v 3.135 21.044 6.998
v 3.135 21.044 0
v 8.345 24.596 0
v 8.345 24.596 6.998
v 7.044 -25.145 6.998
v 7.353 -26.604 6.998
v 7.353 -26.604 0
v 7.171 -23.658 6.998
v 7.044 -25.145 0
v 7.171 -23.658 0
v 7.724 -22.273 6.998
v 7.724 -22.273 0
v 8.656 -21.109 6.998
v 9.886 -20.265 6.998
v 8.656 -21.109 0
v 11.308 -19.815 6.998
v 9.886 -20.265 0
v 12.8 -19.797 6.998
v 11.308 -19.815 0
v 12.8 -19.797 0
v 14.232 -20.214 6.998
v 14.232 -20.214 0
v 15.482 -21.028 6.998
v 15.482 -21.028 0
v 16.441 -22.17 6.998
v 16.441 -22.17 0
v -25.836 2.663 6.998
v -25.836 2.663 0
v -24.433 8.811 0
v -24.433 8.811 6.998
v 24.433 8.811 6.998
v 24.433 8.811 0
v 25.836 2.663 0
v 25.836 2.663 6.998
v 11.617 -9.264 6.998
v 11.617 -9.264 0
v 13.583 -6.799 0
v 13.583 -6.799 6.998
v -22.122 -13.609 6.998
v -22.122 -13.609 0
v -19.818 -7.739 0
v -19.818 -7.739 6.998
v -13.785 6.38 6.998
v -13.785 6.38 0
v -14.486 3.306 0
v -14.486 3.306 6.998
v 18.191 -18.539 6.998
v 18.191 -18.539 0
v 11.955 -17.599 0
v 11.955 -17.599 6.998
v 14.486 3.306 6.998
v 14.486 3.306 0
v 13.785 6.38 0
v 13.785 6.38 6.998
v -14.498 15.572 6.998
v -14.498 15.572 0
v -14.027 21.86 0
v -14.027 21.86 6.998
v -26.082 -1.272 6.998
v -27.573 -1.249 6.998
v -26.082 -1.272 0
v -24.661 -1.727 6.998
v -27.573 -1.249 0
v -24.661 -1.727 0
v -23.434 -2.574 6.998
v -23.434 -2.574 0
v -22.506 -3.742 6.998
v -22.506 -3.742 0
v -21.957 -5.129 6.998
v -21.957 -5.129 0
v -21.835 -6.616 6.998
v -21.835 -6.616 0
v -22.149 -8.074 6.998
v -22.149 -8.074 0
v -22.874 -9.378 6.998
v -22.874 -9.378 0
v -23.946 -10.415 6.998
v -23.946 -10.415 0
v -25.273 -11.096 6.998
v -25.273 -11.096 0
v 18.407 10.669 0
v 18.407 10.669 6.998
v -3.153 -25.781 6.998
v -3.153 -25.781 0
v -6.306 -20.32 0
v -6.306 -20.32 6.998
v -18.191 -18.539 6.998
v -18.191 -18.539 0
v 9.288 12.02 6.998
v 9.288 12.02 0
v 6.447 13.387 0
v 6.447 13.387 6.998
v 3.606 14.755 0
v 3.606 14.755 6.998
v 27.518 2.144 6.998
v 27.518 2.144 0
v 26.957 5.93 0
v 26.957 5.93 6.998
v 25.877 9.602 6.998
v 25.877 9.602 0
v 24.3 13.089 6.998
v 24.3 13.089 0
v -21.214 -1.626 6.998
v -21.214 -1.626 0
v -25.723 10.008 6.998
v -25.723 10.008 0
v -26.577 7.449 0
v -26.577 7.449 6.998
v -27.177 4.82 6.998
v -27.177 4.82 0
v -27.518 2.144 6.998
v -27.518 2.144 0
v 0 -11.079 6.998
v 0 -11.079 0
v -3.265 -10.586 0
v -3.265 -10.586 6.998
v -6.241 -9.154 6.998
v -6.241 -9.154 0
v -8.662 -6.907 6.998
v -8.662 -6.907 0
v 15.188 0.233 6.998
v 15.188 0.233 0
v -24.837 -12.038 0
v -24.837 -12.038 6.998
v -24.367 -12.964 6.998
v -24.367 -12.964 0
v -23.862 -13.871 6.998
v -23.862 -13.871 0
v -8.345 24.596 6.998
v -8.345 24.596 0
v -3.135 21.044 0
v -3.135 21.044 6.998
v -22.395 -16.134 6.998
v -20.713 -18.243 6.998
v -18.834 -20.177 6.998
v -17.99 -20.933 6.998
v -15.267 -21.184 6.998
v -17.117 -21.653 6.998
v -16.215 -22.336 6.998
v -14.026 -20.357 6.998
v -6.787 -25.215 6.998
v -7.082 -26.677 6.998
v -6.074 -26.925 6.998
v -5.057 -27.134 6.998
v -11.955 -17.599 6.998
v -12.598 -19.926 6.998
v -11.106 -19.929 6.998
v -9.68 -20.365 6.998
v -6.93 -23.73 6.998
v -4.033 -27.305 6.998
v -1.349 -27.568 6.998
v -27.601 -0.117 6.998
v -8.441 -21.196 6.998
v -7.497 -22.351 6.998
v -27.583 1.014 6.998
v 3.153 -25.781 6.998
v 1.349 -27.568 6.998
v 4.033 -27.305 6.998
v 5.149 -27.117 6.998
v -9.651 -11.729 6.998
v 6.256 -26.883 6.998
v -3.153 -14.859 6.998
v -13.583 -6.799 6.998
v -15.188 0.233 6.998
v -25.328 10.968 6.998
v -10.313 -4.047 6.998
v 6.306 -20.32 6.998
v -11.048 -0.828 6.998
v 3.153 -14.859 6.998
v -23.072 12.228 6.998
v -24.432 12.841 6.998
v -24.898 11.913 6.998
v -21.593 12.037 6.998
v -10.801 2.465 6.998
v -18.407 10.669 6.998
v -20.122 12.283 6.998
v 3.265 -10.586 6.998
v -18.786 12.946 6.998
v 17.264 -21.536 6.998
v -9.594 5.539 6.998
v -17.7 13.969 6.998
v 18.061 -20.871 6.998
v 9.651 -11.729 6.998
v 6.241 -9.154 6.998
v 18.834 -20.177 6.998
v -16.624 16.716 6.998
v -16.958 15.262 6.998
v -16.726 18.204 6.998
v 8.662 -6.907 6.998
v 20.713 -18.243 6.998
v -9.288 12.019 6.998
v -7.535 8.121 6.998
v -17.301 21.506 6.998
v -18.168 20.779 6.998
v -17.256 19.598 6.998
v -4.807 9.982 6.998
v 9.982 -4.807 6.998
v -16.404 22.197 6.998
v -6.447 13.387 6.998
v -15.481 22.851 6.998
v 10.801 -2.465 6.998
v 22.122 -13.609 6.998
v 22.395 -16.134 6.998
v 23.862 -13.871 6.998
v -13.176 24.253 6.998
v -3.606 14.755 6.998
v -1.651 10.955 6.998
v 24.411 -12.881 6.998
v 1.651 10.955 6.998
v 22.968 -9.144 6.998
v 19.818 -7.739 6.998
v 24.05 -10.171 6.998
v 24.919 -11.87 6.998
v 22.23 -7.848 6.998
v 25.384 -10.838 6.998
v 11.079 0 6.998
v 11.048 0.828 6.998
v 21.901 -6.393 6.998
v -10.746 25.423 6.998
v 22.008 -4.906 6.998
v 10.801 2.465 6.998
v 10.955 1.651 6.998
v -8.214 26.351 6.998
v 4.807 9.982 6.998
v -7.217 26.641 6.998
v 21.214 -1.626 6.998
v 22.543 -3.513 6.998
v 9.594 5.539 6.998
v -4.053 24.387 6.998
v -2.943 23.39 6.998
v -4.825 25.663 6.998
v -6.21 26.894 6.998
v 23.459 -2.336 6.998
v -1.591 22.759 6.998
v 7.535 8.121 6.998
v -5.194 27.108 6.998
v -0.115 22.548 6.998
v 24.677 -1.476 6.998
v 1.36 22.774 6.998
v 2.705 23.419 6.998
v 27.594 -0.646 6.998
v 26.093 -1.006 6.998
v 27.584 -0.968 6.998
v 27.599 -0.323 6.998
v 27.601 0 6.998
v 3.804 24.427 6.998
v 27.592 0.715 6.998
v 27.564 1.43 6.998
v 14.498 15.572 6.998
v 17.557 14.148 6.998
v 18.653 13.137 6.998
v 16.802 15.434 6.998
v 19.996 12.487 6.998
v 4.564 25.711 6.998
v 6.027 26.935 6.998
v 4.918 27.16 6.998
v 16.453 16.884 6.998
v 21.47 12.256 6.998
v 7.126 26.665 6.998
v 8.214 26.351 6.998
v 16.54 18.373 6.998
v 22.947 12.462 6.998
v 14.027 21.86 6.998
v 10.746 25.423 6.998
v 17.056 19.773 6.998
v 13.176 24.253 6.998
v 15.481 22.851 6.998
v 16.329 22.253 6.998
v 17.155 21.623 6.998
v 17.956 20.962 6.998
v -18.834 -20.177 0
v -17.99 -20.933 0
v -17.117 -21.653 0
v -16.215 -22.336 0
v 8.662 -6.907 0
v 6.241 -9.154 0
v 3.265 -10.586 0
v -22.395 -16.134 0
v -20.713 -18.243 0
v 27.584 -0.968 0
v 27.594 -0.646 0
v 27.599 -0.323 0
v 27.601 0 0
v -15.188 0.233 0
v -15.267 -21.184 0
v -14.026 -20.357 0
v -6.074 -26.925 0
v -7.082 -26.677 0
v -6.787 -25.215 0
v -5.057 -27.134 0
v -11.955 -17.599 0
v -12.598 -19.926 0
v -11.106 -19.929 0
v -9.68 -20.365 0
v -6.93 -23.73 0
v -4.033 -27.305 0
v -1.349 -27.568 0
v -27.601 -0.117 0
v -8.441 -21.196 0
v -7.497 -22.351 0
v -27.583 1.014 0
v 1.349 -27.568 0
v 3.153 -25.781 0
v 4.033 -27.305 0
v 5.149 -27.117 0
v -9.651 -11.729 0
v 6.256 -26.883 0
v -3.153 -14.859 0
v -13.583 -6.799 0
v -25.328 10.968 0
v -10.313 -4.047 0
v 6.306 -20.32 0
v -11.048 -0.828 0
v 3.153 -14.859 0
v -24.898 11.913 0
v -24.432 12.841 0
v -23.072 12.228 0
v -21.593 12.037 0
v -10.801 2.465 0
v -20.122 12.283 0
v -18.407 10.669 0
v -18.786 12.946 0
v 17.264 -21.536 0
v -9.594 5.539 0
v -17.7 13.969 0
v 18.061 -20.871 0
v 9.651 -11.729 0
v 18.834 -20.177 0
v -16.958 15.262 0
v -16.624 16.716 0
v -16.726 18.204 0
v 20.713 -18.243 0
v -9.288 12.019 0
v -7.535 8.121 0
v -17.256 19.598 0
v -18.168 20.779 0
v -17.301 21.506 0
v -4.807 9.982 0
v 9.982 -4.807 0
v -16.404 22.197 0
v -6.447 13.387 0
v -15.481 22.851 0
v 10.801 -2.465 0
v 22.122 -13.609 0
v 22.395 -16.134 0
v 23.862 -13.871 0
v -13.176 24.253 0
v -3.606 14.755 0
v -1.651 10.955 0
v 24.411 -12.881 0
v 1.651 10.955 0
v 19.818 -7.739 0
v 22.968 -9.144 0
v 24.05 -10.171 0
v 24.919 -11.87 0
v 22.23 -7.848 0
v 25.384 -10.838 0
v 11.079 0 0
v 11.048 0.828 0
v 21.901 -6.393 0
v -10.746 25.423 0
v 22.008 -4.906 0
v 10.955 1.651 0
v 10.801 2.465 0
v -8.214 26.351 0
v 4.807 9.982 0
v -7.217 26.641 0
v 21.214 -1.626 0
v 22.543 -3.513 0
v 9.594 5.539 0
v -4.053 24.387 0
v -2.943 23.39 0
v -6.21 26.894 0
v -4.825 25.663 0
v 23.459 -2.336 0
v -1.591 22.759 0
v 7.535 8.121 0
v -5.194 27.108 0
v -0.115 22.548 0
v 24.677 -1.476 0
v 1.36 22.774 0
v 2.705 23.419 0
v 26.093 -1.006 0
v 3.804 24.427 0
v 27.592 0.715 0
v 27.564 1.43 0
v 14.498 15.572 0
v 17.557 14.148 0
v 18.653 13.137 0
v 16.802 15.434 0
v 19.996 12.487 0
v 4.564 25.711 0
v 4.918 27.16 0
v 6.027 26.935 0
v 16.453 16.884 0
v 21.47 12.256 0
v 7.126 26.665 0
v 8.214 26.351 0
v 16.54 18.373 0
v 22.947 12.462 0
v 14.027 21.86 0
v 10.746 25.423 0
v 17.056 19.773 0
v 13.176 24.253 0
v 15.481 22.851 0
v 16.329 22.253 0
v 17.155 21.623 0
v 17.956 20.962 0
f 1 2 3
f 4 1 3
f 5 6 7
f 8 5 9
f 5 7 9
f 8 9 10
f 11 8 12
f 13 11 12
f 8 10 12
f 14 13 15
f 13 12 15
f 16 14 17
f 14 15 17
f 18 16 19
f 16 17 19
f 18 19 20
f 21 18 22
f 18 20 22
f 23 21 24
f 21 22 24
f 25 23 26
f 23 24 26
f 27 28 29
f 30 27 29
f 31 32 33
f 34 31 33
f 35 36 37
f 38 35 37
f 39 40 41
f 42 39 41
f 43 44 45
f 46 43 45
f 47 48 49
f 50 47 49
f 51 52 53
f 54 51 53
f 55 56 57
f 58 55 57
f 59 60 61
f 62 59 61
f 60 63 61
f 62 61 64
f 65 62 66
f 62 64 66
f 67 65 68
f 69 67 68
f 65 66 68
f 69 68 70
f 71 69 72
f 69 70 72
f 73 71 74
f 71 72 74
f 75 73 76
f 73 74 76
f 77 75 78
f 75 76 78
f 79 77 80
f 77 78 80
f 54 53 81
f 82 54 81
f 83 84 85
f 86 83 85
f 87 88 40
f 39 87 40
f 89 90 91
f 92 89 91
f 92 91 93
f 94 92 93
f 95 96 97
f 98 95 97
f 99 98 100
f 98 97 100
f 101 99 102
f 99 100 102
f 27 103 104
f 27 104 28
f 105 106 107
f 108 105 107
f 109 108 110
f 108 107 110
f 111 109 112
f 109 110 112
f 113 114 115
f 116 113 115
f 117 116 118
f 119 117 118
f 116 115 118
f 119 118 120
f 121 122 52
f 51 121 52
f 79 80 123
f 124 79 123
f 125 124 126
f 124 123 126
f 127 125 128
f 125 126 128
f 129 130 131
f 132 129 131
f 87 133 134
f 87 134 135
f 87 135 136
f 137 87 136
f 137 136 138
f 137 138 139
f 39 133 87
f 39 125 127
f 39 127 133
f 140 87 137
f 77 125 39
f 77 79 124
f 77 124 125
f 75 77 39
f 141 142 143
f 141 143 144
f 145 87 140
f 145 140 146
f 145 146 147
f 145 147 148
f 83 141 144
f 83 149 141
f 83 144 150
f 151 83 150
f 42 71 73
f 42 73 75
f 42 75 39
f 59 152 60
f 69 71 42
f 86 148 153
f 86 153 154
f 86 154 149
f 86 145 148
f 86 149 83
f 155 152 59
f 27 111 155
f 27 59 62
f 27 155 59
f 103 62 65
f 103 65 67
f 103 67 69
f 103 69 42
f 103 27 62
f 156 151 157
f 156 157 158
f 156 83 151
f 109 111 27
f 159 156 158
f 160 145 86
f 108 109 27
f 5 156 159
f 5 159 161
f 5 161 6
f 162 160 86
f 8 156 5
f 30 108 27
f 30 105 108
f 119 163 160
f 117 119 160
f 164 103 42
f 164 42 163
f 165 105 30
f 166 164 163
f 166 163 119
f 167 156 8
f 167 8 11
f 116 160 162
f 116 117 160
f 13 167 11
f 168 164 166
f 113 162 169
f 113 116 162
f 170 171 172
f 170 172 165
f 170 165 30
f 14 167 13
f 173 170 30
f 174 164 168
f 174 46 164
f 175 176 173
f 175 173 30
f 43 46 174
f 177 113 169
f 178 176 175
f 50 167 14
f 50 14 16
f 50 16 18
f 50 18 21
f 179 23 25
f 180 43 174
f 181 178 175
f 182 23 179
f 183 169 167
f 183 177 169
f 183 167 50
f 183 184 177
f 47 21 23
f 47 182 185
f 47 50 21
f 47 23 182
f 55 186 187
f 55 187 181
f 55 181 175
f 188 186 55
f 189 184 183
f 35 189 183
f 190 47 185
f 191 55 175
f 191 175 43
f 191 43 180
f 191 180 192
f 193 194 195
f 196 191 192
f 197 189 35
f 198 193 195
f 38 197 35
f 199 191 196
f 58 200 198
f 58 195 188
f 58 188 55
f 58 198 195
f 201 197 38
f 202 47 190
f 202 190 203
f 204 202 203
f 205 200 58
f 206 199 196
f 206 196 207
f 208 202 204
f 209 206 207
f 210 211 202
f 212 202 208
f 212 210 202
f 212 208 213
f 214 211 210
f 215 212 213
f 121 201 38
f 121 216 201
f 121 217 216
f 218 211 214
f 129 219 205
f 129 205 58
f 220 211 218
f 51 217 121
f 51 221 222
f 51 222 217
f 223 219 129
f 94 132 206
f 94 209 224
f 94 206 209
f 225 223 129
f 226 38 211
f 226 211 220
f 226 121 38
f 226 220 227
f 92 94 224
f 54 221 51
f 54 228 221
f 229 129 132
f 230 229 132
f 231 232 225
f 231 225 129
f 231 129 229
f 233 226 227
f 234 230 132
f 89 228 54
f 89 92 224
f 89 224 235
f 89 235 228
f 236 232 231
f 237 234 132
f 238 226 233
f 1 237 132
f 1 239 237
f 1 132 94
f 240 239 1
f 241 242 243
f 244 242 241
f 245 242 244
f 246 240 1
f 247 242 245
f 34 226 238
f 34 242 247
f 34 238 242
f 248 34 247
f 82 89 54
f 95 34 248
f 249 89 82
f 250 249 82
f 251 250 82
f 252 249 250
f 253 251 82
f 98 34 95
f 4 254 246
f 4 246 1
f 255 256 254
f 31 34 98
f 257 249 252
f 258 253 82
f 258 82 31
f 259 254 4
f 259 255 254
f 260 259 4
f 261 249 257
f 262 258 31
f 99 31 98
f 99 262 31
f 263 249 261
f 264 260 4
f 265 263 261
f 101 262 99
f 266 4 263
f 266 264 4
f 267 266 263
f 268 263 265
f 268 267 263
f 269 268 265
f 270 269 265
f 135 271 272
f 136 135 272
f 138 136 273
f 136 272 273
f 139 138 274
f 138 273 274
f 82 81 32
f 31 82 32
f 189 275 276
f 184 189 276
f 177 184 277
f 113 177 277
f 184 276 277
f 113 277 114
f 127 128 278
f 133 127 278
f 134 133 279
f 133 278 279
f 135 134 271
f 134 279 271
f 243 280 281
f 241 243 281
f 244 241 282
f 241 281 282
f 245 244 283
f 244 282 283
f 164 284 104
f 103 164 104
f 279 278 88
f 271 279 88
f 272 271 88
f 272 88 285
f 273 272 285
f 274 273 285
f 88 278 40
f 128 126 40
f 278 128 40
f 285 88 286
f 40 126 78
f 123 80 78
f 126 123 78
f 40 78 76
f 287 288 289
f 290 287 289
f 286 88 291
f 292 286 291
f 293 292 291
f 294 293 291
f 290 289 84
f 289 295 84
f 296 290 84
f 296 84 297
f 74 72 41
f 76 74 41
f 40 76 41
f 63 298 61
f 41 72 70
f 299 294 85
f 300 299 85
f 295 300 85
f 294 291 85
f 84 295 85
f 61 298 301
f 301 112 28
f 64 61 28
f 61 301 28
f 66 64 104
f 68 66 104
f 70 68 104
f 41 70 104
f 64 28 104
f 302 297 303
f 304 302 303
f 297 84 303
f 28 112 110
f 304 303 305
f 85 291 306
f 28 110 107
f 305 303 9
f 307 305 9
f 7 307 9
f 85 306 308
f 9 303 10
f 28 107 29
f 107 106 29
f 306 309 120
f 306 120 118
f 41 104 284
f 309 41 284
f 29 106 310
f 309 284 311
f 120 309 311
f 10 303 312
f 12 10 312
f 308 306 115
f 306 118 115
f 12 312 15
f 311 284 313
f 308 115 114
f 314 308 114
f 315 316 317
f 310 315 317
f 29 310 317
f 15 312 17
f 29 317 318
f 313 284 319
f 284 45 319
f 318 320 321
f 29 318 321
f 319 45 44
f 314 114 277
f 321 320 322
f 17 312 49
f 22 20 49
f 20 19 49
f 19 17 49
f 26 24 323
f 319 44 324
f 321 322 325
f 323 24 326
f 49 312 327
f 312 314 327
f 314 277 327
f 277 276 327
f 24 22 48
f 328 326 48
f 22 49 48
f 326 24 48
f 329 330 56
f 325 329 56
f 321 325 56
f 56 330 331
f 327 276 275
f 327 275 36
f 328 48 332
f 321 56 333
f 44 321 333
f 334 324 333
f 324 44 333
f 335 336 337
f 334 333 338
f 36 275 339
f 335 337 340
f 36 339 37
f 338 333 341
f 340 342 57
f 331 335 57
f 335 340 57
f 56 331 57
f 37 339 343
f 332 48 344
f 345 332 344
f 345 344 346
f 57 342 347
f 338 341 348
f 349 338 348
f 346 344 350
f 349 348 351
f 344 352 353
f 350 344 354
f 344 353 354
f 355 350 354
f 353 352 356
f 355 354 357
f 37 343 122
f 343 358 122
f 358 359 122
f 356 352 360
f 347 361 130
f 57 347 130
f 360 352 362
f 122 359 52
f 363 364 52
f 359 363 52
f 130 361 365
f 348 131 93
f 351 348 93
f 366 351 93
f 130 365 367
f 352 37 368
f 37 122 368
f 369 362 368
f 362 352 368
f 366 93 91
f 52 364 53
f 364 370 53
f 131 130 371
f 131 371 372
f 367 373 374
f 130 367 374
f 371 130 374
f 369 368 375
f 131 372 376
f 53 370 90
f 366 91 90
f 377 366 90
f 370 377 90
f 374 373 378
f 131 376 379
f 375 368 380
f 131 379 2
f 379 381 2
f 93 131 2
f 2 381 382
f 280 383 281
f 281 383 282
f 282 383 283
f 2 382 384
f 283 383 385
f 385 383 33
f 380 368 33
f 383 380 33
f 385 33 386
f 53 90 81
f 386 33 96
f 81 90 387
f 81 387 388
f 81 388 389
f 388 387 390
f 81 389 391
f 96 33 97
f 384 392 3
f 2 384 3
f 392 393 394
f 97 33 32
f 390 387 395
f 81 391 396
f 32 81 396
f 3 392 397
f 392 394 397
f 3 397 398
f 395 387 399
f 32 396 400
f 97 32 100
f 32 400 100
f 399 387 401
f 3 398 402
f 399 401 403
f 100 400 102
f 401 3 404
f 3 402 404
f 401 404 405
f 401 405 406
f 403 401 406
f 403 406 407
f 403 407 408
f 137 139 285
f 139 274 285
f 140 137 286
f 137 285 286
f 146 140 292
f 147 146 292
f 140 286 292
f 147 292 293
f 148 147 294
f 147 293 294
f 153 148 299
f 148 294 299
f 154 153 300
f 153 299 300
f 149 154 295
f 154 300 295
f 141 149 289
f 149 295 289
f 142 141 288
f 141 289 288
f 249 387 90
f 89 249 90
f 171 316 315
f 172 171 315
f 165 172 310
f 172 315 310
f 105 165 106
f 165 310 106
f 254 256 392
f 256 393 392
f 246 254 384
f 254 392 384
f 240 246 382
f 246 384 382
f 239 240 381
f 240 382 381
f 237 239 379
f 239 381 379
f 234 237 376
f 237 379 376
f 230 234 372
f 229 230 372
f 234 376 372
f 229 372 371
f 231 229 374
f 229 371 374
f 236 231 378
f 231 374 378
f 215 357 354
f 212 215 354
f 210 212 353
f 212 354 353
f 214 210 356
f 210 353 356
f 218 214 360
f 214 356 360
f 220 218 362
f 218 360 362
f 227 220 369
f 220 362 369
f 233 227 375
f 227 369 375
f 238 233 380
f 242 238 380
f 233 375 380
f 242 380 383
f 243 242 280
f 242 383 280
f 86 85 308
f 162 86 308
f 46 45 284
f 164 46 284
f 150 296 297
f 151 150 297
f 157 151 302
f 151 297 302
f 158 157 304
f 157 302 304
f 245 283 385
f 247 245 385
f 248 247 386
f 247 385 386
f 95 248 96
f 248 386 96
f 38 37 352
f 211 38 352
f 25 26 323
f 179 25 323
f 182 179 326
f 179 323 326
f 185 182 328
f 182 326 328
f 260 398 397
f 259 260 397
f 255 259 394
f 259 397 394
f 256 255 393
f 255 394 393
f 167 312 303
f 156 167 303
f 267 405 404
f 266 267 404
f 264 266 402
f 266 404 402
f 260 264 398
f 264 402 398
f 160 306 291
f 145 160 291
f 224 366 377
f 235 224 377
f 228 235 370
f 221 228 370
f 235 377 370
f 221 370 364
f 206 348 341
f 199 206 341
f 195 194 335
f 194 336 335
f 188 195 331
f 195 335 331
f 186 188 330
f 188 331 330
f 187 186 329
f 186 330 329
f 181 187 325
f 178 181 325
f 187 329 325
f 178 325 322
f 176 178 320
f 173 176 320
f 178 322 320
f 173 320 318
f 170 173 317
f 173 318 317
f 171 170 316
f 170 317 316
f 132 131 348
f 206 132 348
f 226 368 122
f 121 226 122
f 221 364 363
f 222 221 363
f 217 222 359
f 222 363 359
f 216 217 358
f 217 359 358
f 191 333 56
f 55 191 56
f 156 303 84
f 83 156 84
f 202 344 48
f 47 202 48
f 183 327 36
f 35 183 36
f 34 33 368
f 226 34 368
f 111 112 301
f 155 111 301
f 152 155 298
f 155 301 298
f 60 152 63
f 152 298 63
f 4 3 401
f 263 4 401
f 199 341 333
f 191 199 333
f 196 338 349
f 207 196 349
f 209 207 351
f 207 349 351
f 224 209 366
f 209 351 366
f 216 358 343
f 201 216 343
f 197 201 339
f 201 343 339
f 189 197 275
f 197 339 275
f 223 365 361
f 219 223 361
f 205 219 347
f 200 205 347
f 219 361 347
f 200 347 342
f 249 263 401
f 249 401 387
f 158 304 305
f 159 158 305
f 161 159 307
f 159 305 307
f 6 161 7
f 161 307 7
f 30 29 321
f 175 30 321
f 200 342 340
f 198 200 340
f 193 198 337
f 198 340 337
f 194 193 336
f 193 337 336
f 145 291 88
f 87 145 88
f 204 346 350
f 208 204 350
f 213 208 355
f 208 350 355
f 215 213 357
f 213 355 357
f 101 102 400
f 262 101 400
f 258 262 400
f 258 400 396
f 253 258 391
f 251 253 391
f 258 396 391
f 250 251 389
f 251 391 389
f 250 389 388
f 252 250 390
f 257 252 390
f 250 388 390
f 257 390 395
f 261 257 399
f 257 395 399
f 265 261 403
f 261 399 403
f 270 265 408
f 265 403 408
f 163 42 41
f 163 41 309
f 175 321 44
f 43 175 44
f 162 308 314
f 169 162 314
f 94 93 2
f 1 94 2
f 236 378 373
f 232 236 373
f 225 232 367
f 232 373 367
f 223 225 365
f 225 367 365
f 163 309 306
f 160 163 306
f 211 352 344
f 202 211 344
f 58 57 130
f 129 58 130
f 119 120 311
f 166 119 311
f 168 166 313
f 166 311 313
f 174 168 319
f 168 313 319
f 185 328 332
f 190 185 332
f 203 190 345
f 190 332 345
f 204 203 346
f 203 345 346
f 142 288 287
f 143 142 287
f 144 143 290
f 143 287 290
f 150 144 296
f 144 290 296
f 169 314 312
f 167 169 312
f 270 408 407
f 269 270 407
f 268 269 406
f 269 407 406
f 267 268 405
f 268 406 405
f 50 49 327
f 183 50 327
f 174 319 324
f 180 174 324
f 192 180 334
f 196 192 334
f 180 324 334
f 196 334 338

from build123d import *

# Parameters (mm, degrees)
F1_DEPTH = 6.9977
F4_D     = 10.16


# Not quite as in the source:
# - a feature names something its author has since deleted; it is built from what else it names


with BuildPart() as f1:
    # F0 (on Top) → F1 (new body)
    with BuildSketch(Plane.XY):
        with BuildLine():
            Line((13.000663339, 2.9673182751), (10.80089488, 2.4652351906))
            ThreePointArc((10.80089488, 2.4652351906), (11.0089999639, 1.2404170862), (11.0786603321, 0))
            ThreePointArc((11.0786603321, 0), (10.4569630833, -3.65904876), (8.6616464645, -6.9074304395))
            Line((8.6616464645, -6.9074304395), (10.4257240625, -8.3142349481))
            Line((10.4257240625, -8.3142349481), (12.9401280453, -5.1612711132))
            Line((12.9401280453, -5.1612711132), (20.9156255847, -6.3633827272))
            Line((20.9156255847, -6.3633827272), (23.8623151585, -13.8714220112))
            ThreePointArc((23.8623151585, -13.8714220112), (26.6500942722, -7.1832380314), (27.6012034762, 0))
            ThreePointArc((27.6012034762, 0), (27.5803414567, 1.0729391714), (27.5177869348, 2.1442564078))
            Line((27.5177869348, 2.1442564078), (21.6052967122, -3.3417341773))
            Line((21.6052967122, -3.3417341773), (13.8980443892, -0.9643627375))
            Line((13.8980443892, -0.9643627375), (13.000663339, 2.9673182751))
        make_face()
        with BuildLine():
            ThreePointArc((4.8068495738, 9.9815285367), (8.6616446562, 6.9074327071), (10.80089488, 2.4652351906))
            Line((10.80089488, 2.4652351906), (13.000663339, 2.9673182751))
            Line((13.000663339, 2.9673182751), (12.1032822888, 6.8989992876))
            Line((12.1032822888, 6.8989992876), (18.0157725115, 12.3849898727))
            Line((18.0157725115, 12.3849898727), (25.7230248345, 10.0076184329))
            ThreePointArc((25.7230248345, 10.0076184329), (21.5794879008, 17.2090713076), (15.4806129272, 22.8511937704))
            Line((15.4806129272, 22.8511937704), (16.0833555213, 14.8081635766))
            Line((16.0833555213, 14.8081635766), (9.419258347, 10.2646580813))
            Line((9.419258347, 10.2646580813), (5.7858384629, 12.0144204305))
            Line((5.7858384629, 12.0144204305), (4.8068495738, 9.9815285367))
        make_face()
        with BuildLine():
            Line((10.4257240625, -8.3142349481), (8.6616464645, -6.9074304395))
            ThreePointArc((8.6616464645, -6.9074304395), (4.8068513159, -9.9815276977), (0, -11.0786603321))
            Line((0, -11.0786603321), (0, -12.7))
            Line((0, -12.7), (0, -13.335))
            Line((0, -13.335), (4.0327916303, -13.335))
            Line((4.0327916303, -13.335), (8.0655832606, -20.32))
            Line((8.0655832606, -20.32), (4.0327916303, -27.305))
            ThreePointArc((4.0327916303, -27.305), (11.9757152285, -24.8678241529), (18.8335071928, -20.1773496811))
            Line((18.8335071928, -20.1773496811), (10.8580096534, -18.975238067))
            Line((10.8580096534, -18.975238067), (7.9113200797, -11.467198783))
            Line((7.9113200797, -11.467198783), (10.4257240625, -8.3142349481))
        make_face()
        with BuildLine():
            ThreePointArc((-4.8068513159, 9.9815276977), (-9.668e-07, 11.0786603321), (4.8068495738, 9.9815285367))
            Line((4.8068495738, 9.9815285367), (5.7858384629, 12.0144204305))
            Line((5.7858384629, 12.0144204305), (2.1524185788, 13.7641827798))
            Line((2.1524185788, 13.7641827798), (1.5496759847, 21.8072129736))
            Line((1.5496759847, 21.8072129736), (8.2137731589, 26.3507184689))
            ThreePointArc((8.2137731589, 26.3507184689), (-2.4087e-06, 27.6012034762), (-8.213777758, 26.3507170353))
            Line((-8.213777758, 26.3507170353), (-1.5496797908, 21.8072127031))
            Line((-1.5496797908, 21.8072127031), (-2.1524209811, 13.7641824041))
            Line((-2.1524209811, 13.7641824041), (-5.7858405598, 12.0144194207))
            Line((-5.7858405598, 12.0144194207), (-4.8068513159, 9.9815276977))
        make_face()
        Polygon((12.1032822888, 6.8989992876), (13.000663339, 2.9673182751), (13.8980443892, -0.9643627375), (21.6052967122, -3.3417341773), (27.5177869348, 2.1442564078), (25.7230248345, 10.0076184329), (18.0157725115, 12.3849898727), align=None)
        Polygon((15.188042256, 0.2325806629), (14.4864534349, 3.3064403636), (13.7848646139, 6.3803000643), (18.4073569698, 10.6693472491), (24.4330269677, 8.8106750325), (25.8362046098, 2.6629556311), (21.2137122539, -1.6260915537), align=None, mode=Mode.SUBTRACT)
        with BuildLine():
            Line((0, -12.7), (0, -11.0786603321))
            ThreePointArc((0, -11.0786603321), (-4.8068504449, -9.9815281172), (-8.661645259, -6.9074319513))
            Line((-8.661645259, -6.9074319513), (-10.4257226114, -8.3142367677))
            Line((-10.4257226114, -8.3142367677), (-7.9113180783, -11.4672001638))
            Line((-7.9113180783, -11.4672001638), (-10.8580063416, -18.9752399621))
            Line((-10.8580063416, -18.9752399621), (-18.8335036712, -20.1773529681))
            ThreePointArc((-18.8335036712, -20.1773529681), (-11.9757130584, -24.867825198), (-4.0327916303, -27.305))
            Line((-4.0327916303, -27.305), (-8.0655832606, -20.32))
            Line((-8.0655832606, -20.32), (-4.0327916303, -13.335))
            Line((-4.0327916303, -13.335), (0, -13.335))
            Line((0, -13.335), (0, -12.7))
        make_face()
        Polygon((12.9401280453, -5.1612711132), (10.4257240625, -8.3142349481), (7.9113200797, -11.467198783), (10.8580096534, -18.975238067), (18.8335071928, -20.1773496811), (23.8623151585, -13.8714220112), (20.9156255847, -6.3633827272), align=None)
        Polygon((9.6514286337, -11.7294776807), (11.6172353839, -9.2644332279), (13.5830421342, -6.7993887751), (19.8184311195, -7.7392214916), (22.1222066044, -13.6091431136), (18.190593104, -18.5392320191), (11.9552041187, -17.5993993027), align=None, mode=Mode.SUBTRACT)
        with BuildLine():
            ThreePointArc((-10.8008953103, 2.4652333055), (-8.6616458618, 6.9074311954), (-4.8068513159, 9.9815276977))
            Line((-4.8068513159, 9.9815276977), (-5.7858405598, 12.0144194207))
            Line((-5.7858405598, 12.0144194207), (-9.4192601386, 10.2646564373))
            Line((-9.4192601386, 10.2646564373), (-16.0833581058, 14.8081607695))
            Line((-16.0833581058, 14.8081607695), (-15.4806169155, 22.8511910685))
            ThreePointArc((-15.4806169155, 22.8511910685), (-21.5794909044, 17.2090675413), (-25.7230265811, 10.0076139433))
            Line((-25.7230265811, 10.0076139433), (-18.0157746731, 12.3849867284))
            Line((-18.0157746731, 12.3849867284), (-12.103283493, 6.8989971751))
            Line((-12.103283493, 6.8989971751), (-13.0006638569, 2.967316006))
            Line((-13.0006638569, 2.967316006), (-10.8008953103, 2.4652333055))
        make_face()
        Polygon((2.1524185788, 13.7641827798), (5.7858384629, 12.0144204305), (9.419258347, 10.2646580813), (16.0833555213, 14.8081635766), (15.4806129272, 22.8511937704), (8.2137731589, 26.3507184689), (1.5496759847, 21.8072129736), align=None)
        Polygon((9.287750872, 12.0195010326), (6.4470771444, 13.3874970511), (3.6064034168, 14.7554930697), (3.1351682978, 21.0436803121), (8.345280634, 24.5958755175), (14.0266280892, 21.8598834805), (14.4978632082, 15.5716962381), align=None, mode=Mode.SUBTRACT)
        with BuildLine():
            Line((-10.4257226114, -8.3142367677), (-8.661645259, -6.9074319513))
            ThreePointArc((-8.661645259, -6.9074319513), (-10.8008950951, -2.465234248), (-10.8008953103, 2.4652333055))
            Line((-10.8008953103, 2.4652333055), (-13.0006638569, 2.967316006))
            Line((-13.0006638569, 2.967316006), (-13.8980442209, -0.9643651631))
            Line((-13.8980442209, -0.9643651631), (-21.6052961289, -3.3417379482))
            Line((-21.6052961289, -3.3417379482), (-27.5177873091, 2.1442516051))
            ThreePointArc((-27.5177873091, 2.1442516051), (-26.909183449, -6.1418465822), (-23.8623127374, -13.8714261759))
            Line((-23.8623127374, -13.8714261759), (-20.9156244741, -6.3633863777))
            Line((-20.9156244741, -6.3633863777), (-12.9401271445, -5.1612733716))
            Line((-12.9401271445, -5.1612733716), (-10.4257226114, -8.3142367677))
        make_face()
        Polygon((-11.0835964967, -4.9326477372), (-9.8135964967, -7.1323522628), (-10.3635226281, -7.4498522628), (-11.6335226281, -5.2501477372), align=None, mode=Mode.SUBTRACT)
        Polygon((-9.4192601386, 10.2646564373), (-5.7858405598, 12.0144194207), (-2.1524209811, 13.7641824041), (-1.5496797908, 21.8072127031), (-8.213777758, 26.3507170353), (-15.4806169155, 22.8511910685), (-16.0833581058, 14.8081607695), align=None)
        Polygon((-3.6064059921, 14.7554924402), (-6.4470794809, 13.3874959259), (-9.2877529698, 12.0194994116), (-14.497865926, 15.5716937077), (-14.0266319045, 21.8598810324), (-8.3452849268, 24.595874061), (-3.1351719706, 21.0436797649), align=None, mode=Mode.SUBTRACT)
        Polygon((-7.9113180783, -11.4672001638), (-10.4257226114, -8.3142367677), (-12.9401271445, -5.1612733716), (-20.9156244741, -6.3633863777), (-23.8623127374, -13.8714261759), (-18.8335036712, -20.1773529681), (-10.8580063416, -18.9752399621), align=None)
        Polygon((-13.5830409474, -6.7993911458), (-11.617233767, -9.2644352555), (-9.6514265866, -11.7294793652), (-11.955201047, -17.5994013892), (-18.1905898683, -18.539235194), (-22.1222042292, -13.6091469746), (-19.8184297687, -7.7392249505), align=None, mode=Mode.SUBTRACT)
        Polygon((-13.8980442209, -0.9643651631), (-13.0006638569, 2.967316006), (-12.103283493, 6.8989971751), (-18.0157746731, 12.3849867284), (-25.7230265811, 10.0076139433), (-27.5177873091, 2.1442516051), (-21.6052961289, -3.3417379482), align=None)
        Polygon((-13.7848657274, 6.3802976584), (-14.486454012, 3.3064378353), (-15.1880422965, 0.2325780121), (-21.2137119701, -1.6260952562), (-25.8362050746, 2.6629511218), (-24.4330285055, 8.8106707681), (-18.4073588319, 10.6693440364), align=None, mode=Mode.SUBTRACT)
        Polygon((4.0327916303, -13.335), (0, -13.335), (-4.0327916303, -13.335), (-8.0655832606, -20.32), (-4.0327916303, -27.305), (4.0327916303, -27.305), (8.0655832606, -20.32), align=None)
        Polygon((-3.15290982, -14.859), (0, -14.859), (3.15290982, -14.859), (6.3058196401, -20.32), (3.15290982, -25.781), (-3.15290982, -25.781), (-6.3058196401, -20.32), align=None, mode=Mode.SUBTRACT)
        with BuildLine():
            Line((25.7230248345, 10.0076184329), (27.5177869348, 2.1442564078))
            ThreePointArc((27.5177869348, 2.1442564078), (26.9091829131, 6.1418489305), (25.7230248345, 10.0076184329))
        make_face()
        with BuildLine():
            Line((23.8623151585, -13.8714220112), (18.8335071928, -20.1773496811))
            ThreePointArc((18.8335071928, -20.1773496811), (21.5794924062, -17.2090656581), (23.8623151585, -13.8714220112))
        make_face()
        with BuildLine():
            Line((8.2137731589, 26.3507184689), (15.4806129272, 22.8511937704))
            ThreePointArc((15.4806129272, 22.8511937704), (11.9757108882, 24.8678262431), (8.2137731589, 26.3507184689))
        make_face()
        with BuildLine():
            ThreePointArc((-4.0327916303, -27.305), (0, -27.6012034762), (4.0327916303, -27.305))
            Line((4.0327916303, -27.305), (-4.0327916303, -27.305))
        make_face()
        with BuildLine():
            Line((-15.4806169155, 22.8511910685), (-8.213777758, 26.3507170353))
            ThreePointArc((-8.213777758, 26.3507170353), (-11.9757152285, 24.8678241529), (-15.4806169155, 22.8511910685))
        make_face()
        with BuildLine():
            Line((-18.8335036712, -20.1773529681), (-23.8623127374, -13.8714261759))
            ThreePointArc((-23.8623127374, -13.8714261759), (-21.5794894026, -17.2090694245), (-18.8335036712, -20.1773529681))
        make_face()
        with BuildLine():
            Line((-27.5177873091, 2.1442516051), (-25.7230265811, 10.0076139433))
            ThreePointArc((-25.7230265811, 10.0076139433), (-26.909183985, 6.141844234), (-27.5177873091, 2.1442516051))
        make_face()
        Polygon((-10.3635226281, -7.4498522628), (-9.8135964967, -7.1323522628), (-11.0835964967, -4.9326477372), (-11.6335226281, -5.2501477372), align=None)
    extrude(amount=F1_DEPTH)

    # F4 (through all)
    with Locations(Plane.XY.offset(6.9977)):
        with Locations((-21.6878161621, 17.115694081), (-0.1405437248, 27.6276781728), (21.5125610038, 17.3354570985), (26.9662685203, -6.0107167498), (12.1138258294, -24.8306982893), (-11.8605747881, -24.952657563), (-26.9037206785, -6.2847567503)):
            Hole(F4_D / 2)


solid = f1.part
